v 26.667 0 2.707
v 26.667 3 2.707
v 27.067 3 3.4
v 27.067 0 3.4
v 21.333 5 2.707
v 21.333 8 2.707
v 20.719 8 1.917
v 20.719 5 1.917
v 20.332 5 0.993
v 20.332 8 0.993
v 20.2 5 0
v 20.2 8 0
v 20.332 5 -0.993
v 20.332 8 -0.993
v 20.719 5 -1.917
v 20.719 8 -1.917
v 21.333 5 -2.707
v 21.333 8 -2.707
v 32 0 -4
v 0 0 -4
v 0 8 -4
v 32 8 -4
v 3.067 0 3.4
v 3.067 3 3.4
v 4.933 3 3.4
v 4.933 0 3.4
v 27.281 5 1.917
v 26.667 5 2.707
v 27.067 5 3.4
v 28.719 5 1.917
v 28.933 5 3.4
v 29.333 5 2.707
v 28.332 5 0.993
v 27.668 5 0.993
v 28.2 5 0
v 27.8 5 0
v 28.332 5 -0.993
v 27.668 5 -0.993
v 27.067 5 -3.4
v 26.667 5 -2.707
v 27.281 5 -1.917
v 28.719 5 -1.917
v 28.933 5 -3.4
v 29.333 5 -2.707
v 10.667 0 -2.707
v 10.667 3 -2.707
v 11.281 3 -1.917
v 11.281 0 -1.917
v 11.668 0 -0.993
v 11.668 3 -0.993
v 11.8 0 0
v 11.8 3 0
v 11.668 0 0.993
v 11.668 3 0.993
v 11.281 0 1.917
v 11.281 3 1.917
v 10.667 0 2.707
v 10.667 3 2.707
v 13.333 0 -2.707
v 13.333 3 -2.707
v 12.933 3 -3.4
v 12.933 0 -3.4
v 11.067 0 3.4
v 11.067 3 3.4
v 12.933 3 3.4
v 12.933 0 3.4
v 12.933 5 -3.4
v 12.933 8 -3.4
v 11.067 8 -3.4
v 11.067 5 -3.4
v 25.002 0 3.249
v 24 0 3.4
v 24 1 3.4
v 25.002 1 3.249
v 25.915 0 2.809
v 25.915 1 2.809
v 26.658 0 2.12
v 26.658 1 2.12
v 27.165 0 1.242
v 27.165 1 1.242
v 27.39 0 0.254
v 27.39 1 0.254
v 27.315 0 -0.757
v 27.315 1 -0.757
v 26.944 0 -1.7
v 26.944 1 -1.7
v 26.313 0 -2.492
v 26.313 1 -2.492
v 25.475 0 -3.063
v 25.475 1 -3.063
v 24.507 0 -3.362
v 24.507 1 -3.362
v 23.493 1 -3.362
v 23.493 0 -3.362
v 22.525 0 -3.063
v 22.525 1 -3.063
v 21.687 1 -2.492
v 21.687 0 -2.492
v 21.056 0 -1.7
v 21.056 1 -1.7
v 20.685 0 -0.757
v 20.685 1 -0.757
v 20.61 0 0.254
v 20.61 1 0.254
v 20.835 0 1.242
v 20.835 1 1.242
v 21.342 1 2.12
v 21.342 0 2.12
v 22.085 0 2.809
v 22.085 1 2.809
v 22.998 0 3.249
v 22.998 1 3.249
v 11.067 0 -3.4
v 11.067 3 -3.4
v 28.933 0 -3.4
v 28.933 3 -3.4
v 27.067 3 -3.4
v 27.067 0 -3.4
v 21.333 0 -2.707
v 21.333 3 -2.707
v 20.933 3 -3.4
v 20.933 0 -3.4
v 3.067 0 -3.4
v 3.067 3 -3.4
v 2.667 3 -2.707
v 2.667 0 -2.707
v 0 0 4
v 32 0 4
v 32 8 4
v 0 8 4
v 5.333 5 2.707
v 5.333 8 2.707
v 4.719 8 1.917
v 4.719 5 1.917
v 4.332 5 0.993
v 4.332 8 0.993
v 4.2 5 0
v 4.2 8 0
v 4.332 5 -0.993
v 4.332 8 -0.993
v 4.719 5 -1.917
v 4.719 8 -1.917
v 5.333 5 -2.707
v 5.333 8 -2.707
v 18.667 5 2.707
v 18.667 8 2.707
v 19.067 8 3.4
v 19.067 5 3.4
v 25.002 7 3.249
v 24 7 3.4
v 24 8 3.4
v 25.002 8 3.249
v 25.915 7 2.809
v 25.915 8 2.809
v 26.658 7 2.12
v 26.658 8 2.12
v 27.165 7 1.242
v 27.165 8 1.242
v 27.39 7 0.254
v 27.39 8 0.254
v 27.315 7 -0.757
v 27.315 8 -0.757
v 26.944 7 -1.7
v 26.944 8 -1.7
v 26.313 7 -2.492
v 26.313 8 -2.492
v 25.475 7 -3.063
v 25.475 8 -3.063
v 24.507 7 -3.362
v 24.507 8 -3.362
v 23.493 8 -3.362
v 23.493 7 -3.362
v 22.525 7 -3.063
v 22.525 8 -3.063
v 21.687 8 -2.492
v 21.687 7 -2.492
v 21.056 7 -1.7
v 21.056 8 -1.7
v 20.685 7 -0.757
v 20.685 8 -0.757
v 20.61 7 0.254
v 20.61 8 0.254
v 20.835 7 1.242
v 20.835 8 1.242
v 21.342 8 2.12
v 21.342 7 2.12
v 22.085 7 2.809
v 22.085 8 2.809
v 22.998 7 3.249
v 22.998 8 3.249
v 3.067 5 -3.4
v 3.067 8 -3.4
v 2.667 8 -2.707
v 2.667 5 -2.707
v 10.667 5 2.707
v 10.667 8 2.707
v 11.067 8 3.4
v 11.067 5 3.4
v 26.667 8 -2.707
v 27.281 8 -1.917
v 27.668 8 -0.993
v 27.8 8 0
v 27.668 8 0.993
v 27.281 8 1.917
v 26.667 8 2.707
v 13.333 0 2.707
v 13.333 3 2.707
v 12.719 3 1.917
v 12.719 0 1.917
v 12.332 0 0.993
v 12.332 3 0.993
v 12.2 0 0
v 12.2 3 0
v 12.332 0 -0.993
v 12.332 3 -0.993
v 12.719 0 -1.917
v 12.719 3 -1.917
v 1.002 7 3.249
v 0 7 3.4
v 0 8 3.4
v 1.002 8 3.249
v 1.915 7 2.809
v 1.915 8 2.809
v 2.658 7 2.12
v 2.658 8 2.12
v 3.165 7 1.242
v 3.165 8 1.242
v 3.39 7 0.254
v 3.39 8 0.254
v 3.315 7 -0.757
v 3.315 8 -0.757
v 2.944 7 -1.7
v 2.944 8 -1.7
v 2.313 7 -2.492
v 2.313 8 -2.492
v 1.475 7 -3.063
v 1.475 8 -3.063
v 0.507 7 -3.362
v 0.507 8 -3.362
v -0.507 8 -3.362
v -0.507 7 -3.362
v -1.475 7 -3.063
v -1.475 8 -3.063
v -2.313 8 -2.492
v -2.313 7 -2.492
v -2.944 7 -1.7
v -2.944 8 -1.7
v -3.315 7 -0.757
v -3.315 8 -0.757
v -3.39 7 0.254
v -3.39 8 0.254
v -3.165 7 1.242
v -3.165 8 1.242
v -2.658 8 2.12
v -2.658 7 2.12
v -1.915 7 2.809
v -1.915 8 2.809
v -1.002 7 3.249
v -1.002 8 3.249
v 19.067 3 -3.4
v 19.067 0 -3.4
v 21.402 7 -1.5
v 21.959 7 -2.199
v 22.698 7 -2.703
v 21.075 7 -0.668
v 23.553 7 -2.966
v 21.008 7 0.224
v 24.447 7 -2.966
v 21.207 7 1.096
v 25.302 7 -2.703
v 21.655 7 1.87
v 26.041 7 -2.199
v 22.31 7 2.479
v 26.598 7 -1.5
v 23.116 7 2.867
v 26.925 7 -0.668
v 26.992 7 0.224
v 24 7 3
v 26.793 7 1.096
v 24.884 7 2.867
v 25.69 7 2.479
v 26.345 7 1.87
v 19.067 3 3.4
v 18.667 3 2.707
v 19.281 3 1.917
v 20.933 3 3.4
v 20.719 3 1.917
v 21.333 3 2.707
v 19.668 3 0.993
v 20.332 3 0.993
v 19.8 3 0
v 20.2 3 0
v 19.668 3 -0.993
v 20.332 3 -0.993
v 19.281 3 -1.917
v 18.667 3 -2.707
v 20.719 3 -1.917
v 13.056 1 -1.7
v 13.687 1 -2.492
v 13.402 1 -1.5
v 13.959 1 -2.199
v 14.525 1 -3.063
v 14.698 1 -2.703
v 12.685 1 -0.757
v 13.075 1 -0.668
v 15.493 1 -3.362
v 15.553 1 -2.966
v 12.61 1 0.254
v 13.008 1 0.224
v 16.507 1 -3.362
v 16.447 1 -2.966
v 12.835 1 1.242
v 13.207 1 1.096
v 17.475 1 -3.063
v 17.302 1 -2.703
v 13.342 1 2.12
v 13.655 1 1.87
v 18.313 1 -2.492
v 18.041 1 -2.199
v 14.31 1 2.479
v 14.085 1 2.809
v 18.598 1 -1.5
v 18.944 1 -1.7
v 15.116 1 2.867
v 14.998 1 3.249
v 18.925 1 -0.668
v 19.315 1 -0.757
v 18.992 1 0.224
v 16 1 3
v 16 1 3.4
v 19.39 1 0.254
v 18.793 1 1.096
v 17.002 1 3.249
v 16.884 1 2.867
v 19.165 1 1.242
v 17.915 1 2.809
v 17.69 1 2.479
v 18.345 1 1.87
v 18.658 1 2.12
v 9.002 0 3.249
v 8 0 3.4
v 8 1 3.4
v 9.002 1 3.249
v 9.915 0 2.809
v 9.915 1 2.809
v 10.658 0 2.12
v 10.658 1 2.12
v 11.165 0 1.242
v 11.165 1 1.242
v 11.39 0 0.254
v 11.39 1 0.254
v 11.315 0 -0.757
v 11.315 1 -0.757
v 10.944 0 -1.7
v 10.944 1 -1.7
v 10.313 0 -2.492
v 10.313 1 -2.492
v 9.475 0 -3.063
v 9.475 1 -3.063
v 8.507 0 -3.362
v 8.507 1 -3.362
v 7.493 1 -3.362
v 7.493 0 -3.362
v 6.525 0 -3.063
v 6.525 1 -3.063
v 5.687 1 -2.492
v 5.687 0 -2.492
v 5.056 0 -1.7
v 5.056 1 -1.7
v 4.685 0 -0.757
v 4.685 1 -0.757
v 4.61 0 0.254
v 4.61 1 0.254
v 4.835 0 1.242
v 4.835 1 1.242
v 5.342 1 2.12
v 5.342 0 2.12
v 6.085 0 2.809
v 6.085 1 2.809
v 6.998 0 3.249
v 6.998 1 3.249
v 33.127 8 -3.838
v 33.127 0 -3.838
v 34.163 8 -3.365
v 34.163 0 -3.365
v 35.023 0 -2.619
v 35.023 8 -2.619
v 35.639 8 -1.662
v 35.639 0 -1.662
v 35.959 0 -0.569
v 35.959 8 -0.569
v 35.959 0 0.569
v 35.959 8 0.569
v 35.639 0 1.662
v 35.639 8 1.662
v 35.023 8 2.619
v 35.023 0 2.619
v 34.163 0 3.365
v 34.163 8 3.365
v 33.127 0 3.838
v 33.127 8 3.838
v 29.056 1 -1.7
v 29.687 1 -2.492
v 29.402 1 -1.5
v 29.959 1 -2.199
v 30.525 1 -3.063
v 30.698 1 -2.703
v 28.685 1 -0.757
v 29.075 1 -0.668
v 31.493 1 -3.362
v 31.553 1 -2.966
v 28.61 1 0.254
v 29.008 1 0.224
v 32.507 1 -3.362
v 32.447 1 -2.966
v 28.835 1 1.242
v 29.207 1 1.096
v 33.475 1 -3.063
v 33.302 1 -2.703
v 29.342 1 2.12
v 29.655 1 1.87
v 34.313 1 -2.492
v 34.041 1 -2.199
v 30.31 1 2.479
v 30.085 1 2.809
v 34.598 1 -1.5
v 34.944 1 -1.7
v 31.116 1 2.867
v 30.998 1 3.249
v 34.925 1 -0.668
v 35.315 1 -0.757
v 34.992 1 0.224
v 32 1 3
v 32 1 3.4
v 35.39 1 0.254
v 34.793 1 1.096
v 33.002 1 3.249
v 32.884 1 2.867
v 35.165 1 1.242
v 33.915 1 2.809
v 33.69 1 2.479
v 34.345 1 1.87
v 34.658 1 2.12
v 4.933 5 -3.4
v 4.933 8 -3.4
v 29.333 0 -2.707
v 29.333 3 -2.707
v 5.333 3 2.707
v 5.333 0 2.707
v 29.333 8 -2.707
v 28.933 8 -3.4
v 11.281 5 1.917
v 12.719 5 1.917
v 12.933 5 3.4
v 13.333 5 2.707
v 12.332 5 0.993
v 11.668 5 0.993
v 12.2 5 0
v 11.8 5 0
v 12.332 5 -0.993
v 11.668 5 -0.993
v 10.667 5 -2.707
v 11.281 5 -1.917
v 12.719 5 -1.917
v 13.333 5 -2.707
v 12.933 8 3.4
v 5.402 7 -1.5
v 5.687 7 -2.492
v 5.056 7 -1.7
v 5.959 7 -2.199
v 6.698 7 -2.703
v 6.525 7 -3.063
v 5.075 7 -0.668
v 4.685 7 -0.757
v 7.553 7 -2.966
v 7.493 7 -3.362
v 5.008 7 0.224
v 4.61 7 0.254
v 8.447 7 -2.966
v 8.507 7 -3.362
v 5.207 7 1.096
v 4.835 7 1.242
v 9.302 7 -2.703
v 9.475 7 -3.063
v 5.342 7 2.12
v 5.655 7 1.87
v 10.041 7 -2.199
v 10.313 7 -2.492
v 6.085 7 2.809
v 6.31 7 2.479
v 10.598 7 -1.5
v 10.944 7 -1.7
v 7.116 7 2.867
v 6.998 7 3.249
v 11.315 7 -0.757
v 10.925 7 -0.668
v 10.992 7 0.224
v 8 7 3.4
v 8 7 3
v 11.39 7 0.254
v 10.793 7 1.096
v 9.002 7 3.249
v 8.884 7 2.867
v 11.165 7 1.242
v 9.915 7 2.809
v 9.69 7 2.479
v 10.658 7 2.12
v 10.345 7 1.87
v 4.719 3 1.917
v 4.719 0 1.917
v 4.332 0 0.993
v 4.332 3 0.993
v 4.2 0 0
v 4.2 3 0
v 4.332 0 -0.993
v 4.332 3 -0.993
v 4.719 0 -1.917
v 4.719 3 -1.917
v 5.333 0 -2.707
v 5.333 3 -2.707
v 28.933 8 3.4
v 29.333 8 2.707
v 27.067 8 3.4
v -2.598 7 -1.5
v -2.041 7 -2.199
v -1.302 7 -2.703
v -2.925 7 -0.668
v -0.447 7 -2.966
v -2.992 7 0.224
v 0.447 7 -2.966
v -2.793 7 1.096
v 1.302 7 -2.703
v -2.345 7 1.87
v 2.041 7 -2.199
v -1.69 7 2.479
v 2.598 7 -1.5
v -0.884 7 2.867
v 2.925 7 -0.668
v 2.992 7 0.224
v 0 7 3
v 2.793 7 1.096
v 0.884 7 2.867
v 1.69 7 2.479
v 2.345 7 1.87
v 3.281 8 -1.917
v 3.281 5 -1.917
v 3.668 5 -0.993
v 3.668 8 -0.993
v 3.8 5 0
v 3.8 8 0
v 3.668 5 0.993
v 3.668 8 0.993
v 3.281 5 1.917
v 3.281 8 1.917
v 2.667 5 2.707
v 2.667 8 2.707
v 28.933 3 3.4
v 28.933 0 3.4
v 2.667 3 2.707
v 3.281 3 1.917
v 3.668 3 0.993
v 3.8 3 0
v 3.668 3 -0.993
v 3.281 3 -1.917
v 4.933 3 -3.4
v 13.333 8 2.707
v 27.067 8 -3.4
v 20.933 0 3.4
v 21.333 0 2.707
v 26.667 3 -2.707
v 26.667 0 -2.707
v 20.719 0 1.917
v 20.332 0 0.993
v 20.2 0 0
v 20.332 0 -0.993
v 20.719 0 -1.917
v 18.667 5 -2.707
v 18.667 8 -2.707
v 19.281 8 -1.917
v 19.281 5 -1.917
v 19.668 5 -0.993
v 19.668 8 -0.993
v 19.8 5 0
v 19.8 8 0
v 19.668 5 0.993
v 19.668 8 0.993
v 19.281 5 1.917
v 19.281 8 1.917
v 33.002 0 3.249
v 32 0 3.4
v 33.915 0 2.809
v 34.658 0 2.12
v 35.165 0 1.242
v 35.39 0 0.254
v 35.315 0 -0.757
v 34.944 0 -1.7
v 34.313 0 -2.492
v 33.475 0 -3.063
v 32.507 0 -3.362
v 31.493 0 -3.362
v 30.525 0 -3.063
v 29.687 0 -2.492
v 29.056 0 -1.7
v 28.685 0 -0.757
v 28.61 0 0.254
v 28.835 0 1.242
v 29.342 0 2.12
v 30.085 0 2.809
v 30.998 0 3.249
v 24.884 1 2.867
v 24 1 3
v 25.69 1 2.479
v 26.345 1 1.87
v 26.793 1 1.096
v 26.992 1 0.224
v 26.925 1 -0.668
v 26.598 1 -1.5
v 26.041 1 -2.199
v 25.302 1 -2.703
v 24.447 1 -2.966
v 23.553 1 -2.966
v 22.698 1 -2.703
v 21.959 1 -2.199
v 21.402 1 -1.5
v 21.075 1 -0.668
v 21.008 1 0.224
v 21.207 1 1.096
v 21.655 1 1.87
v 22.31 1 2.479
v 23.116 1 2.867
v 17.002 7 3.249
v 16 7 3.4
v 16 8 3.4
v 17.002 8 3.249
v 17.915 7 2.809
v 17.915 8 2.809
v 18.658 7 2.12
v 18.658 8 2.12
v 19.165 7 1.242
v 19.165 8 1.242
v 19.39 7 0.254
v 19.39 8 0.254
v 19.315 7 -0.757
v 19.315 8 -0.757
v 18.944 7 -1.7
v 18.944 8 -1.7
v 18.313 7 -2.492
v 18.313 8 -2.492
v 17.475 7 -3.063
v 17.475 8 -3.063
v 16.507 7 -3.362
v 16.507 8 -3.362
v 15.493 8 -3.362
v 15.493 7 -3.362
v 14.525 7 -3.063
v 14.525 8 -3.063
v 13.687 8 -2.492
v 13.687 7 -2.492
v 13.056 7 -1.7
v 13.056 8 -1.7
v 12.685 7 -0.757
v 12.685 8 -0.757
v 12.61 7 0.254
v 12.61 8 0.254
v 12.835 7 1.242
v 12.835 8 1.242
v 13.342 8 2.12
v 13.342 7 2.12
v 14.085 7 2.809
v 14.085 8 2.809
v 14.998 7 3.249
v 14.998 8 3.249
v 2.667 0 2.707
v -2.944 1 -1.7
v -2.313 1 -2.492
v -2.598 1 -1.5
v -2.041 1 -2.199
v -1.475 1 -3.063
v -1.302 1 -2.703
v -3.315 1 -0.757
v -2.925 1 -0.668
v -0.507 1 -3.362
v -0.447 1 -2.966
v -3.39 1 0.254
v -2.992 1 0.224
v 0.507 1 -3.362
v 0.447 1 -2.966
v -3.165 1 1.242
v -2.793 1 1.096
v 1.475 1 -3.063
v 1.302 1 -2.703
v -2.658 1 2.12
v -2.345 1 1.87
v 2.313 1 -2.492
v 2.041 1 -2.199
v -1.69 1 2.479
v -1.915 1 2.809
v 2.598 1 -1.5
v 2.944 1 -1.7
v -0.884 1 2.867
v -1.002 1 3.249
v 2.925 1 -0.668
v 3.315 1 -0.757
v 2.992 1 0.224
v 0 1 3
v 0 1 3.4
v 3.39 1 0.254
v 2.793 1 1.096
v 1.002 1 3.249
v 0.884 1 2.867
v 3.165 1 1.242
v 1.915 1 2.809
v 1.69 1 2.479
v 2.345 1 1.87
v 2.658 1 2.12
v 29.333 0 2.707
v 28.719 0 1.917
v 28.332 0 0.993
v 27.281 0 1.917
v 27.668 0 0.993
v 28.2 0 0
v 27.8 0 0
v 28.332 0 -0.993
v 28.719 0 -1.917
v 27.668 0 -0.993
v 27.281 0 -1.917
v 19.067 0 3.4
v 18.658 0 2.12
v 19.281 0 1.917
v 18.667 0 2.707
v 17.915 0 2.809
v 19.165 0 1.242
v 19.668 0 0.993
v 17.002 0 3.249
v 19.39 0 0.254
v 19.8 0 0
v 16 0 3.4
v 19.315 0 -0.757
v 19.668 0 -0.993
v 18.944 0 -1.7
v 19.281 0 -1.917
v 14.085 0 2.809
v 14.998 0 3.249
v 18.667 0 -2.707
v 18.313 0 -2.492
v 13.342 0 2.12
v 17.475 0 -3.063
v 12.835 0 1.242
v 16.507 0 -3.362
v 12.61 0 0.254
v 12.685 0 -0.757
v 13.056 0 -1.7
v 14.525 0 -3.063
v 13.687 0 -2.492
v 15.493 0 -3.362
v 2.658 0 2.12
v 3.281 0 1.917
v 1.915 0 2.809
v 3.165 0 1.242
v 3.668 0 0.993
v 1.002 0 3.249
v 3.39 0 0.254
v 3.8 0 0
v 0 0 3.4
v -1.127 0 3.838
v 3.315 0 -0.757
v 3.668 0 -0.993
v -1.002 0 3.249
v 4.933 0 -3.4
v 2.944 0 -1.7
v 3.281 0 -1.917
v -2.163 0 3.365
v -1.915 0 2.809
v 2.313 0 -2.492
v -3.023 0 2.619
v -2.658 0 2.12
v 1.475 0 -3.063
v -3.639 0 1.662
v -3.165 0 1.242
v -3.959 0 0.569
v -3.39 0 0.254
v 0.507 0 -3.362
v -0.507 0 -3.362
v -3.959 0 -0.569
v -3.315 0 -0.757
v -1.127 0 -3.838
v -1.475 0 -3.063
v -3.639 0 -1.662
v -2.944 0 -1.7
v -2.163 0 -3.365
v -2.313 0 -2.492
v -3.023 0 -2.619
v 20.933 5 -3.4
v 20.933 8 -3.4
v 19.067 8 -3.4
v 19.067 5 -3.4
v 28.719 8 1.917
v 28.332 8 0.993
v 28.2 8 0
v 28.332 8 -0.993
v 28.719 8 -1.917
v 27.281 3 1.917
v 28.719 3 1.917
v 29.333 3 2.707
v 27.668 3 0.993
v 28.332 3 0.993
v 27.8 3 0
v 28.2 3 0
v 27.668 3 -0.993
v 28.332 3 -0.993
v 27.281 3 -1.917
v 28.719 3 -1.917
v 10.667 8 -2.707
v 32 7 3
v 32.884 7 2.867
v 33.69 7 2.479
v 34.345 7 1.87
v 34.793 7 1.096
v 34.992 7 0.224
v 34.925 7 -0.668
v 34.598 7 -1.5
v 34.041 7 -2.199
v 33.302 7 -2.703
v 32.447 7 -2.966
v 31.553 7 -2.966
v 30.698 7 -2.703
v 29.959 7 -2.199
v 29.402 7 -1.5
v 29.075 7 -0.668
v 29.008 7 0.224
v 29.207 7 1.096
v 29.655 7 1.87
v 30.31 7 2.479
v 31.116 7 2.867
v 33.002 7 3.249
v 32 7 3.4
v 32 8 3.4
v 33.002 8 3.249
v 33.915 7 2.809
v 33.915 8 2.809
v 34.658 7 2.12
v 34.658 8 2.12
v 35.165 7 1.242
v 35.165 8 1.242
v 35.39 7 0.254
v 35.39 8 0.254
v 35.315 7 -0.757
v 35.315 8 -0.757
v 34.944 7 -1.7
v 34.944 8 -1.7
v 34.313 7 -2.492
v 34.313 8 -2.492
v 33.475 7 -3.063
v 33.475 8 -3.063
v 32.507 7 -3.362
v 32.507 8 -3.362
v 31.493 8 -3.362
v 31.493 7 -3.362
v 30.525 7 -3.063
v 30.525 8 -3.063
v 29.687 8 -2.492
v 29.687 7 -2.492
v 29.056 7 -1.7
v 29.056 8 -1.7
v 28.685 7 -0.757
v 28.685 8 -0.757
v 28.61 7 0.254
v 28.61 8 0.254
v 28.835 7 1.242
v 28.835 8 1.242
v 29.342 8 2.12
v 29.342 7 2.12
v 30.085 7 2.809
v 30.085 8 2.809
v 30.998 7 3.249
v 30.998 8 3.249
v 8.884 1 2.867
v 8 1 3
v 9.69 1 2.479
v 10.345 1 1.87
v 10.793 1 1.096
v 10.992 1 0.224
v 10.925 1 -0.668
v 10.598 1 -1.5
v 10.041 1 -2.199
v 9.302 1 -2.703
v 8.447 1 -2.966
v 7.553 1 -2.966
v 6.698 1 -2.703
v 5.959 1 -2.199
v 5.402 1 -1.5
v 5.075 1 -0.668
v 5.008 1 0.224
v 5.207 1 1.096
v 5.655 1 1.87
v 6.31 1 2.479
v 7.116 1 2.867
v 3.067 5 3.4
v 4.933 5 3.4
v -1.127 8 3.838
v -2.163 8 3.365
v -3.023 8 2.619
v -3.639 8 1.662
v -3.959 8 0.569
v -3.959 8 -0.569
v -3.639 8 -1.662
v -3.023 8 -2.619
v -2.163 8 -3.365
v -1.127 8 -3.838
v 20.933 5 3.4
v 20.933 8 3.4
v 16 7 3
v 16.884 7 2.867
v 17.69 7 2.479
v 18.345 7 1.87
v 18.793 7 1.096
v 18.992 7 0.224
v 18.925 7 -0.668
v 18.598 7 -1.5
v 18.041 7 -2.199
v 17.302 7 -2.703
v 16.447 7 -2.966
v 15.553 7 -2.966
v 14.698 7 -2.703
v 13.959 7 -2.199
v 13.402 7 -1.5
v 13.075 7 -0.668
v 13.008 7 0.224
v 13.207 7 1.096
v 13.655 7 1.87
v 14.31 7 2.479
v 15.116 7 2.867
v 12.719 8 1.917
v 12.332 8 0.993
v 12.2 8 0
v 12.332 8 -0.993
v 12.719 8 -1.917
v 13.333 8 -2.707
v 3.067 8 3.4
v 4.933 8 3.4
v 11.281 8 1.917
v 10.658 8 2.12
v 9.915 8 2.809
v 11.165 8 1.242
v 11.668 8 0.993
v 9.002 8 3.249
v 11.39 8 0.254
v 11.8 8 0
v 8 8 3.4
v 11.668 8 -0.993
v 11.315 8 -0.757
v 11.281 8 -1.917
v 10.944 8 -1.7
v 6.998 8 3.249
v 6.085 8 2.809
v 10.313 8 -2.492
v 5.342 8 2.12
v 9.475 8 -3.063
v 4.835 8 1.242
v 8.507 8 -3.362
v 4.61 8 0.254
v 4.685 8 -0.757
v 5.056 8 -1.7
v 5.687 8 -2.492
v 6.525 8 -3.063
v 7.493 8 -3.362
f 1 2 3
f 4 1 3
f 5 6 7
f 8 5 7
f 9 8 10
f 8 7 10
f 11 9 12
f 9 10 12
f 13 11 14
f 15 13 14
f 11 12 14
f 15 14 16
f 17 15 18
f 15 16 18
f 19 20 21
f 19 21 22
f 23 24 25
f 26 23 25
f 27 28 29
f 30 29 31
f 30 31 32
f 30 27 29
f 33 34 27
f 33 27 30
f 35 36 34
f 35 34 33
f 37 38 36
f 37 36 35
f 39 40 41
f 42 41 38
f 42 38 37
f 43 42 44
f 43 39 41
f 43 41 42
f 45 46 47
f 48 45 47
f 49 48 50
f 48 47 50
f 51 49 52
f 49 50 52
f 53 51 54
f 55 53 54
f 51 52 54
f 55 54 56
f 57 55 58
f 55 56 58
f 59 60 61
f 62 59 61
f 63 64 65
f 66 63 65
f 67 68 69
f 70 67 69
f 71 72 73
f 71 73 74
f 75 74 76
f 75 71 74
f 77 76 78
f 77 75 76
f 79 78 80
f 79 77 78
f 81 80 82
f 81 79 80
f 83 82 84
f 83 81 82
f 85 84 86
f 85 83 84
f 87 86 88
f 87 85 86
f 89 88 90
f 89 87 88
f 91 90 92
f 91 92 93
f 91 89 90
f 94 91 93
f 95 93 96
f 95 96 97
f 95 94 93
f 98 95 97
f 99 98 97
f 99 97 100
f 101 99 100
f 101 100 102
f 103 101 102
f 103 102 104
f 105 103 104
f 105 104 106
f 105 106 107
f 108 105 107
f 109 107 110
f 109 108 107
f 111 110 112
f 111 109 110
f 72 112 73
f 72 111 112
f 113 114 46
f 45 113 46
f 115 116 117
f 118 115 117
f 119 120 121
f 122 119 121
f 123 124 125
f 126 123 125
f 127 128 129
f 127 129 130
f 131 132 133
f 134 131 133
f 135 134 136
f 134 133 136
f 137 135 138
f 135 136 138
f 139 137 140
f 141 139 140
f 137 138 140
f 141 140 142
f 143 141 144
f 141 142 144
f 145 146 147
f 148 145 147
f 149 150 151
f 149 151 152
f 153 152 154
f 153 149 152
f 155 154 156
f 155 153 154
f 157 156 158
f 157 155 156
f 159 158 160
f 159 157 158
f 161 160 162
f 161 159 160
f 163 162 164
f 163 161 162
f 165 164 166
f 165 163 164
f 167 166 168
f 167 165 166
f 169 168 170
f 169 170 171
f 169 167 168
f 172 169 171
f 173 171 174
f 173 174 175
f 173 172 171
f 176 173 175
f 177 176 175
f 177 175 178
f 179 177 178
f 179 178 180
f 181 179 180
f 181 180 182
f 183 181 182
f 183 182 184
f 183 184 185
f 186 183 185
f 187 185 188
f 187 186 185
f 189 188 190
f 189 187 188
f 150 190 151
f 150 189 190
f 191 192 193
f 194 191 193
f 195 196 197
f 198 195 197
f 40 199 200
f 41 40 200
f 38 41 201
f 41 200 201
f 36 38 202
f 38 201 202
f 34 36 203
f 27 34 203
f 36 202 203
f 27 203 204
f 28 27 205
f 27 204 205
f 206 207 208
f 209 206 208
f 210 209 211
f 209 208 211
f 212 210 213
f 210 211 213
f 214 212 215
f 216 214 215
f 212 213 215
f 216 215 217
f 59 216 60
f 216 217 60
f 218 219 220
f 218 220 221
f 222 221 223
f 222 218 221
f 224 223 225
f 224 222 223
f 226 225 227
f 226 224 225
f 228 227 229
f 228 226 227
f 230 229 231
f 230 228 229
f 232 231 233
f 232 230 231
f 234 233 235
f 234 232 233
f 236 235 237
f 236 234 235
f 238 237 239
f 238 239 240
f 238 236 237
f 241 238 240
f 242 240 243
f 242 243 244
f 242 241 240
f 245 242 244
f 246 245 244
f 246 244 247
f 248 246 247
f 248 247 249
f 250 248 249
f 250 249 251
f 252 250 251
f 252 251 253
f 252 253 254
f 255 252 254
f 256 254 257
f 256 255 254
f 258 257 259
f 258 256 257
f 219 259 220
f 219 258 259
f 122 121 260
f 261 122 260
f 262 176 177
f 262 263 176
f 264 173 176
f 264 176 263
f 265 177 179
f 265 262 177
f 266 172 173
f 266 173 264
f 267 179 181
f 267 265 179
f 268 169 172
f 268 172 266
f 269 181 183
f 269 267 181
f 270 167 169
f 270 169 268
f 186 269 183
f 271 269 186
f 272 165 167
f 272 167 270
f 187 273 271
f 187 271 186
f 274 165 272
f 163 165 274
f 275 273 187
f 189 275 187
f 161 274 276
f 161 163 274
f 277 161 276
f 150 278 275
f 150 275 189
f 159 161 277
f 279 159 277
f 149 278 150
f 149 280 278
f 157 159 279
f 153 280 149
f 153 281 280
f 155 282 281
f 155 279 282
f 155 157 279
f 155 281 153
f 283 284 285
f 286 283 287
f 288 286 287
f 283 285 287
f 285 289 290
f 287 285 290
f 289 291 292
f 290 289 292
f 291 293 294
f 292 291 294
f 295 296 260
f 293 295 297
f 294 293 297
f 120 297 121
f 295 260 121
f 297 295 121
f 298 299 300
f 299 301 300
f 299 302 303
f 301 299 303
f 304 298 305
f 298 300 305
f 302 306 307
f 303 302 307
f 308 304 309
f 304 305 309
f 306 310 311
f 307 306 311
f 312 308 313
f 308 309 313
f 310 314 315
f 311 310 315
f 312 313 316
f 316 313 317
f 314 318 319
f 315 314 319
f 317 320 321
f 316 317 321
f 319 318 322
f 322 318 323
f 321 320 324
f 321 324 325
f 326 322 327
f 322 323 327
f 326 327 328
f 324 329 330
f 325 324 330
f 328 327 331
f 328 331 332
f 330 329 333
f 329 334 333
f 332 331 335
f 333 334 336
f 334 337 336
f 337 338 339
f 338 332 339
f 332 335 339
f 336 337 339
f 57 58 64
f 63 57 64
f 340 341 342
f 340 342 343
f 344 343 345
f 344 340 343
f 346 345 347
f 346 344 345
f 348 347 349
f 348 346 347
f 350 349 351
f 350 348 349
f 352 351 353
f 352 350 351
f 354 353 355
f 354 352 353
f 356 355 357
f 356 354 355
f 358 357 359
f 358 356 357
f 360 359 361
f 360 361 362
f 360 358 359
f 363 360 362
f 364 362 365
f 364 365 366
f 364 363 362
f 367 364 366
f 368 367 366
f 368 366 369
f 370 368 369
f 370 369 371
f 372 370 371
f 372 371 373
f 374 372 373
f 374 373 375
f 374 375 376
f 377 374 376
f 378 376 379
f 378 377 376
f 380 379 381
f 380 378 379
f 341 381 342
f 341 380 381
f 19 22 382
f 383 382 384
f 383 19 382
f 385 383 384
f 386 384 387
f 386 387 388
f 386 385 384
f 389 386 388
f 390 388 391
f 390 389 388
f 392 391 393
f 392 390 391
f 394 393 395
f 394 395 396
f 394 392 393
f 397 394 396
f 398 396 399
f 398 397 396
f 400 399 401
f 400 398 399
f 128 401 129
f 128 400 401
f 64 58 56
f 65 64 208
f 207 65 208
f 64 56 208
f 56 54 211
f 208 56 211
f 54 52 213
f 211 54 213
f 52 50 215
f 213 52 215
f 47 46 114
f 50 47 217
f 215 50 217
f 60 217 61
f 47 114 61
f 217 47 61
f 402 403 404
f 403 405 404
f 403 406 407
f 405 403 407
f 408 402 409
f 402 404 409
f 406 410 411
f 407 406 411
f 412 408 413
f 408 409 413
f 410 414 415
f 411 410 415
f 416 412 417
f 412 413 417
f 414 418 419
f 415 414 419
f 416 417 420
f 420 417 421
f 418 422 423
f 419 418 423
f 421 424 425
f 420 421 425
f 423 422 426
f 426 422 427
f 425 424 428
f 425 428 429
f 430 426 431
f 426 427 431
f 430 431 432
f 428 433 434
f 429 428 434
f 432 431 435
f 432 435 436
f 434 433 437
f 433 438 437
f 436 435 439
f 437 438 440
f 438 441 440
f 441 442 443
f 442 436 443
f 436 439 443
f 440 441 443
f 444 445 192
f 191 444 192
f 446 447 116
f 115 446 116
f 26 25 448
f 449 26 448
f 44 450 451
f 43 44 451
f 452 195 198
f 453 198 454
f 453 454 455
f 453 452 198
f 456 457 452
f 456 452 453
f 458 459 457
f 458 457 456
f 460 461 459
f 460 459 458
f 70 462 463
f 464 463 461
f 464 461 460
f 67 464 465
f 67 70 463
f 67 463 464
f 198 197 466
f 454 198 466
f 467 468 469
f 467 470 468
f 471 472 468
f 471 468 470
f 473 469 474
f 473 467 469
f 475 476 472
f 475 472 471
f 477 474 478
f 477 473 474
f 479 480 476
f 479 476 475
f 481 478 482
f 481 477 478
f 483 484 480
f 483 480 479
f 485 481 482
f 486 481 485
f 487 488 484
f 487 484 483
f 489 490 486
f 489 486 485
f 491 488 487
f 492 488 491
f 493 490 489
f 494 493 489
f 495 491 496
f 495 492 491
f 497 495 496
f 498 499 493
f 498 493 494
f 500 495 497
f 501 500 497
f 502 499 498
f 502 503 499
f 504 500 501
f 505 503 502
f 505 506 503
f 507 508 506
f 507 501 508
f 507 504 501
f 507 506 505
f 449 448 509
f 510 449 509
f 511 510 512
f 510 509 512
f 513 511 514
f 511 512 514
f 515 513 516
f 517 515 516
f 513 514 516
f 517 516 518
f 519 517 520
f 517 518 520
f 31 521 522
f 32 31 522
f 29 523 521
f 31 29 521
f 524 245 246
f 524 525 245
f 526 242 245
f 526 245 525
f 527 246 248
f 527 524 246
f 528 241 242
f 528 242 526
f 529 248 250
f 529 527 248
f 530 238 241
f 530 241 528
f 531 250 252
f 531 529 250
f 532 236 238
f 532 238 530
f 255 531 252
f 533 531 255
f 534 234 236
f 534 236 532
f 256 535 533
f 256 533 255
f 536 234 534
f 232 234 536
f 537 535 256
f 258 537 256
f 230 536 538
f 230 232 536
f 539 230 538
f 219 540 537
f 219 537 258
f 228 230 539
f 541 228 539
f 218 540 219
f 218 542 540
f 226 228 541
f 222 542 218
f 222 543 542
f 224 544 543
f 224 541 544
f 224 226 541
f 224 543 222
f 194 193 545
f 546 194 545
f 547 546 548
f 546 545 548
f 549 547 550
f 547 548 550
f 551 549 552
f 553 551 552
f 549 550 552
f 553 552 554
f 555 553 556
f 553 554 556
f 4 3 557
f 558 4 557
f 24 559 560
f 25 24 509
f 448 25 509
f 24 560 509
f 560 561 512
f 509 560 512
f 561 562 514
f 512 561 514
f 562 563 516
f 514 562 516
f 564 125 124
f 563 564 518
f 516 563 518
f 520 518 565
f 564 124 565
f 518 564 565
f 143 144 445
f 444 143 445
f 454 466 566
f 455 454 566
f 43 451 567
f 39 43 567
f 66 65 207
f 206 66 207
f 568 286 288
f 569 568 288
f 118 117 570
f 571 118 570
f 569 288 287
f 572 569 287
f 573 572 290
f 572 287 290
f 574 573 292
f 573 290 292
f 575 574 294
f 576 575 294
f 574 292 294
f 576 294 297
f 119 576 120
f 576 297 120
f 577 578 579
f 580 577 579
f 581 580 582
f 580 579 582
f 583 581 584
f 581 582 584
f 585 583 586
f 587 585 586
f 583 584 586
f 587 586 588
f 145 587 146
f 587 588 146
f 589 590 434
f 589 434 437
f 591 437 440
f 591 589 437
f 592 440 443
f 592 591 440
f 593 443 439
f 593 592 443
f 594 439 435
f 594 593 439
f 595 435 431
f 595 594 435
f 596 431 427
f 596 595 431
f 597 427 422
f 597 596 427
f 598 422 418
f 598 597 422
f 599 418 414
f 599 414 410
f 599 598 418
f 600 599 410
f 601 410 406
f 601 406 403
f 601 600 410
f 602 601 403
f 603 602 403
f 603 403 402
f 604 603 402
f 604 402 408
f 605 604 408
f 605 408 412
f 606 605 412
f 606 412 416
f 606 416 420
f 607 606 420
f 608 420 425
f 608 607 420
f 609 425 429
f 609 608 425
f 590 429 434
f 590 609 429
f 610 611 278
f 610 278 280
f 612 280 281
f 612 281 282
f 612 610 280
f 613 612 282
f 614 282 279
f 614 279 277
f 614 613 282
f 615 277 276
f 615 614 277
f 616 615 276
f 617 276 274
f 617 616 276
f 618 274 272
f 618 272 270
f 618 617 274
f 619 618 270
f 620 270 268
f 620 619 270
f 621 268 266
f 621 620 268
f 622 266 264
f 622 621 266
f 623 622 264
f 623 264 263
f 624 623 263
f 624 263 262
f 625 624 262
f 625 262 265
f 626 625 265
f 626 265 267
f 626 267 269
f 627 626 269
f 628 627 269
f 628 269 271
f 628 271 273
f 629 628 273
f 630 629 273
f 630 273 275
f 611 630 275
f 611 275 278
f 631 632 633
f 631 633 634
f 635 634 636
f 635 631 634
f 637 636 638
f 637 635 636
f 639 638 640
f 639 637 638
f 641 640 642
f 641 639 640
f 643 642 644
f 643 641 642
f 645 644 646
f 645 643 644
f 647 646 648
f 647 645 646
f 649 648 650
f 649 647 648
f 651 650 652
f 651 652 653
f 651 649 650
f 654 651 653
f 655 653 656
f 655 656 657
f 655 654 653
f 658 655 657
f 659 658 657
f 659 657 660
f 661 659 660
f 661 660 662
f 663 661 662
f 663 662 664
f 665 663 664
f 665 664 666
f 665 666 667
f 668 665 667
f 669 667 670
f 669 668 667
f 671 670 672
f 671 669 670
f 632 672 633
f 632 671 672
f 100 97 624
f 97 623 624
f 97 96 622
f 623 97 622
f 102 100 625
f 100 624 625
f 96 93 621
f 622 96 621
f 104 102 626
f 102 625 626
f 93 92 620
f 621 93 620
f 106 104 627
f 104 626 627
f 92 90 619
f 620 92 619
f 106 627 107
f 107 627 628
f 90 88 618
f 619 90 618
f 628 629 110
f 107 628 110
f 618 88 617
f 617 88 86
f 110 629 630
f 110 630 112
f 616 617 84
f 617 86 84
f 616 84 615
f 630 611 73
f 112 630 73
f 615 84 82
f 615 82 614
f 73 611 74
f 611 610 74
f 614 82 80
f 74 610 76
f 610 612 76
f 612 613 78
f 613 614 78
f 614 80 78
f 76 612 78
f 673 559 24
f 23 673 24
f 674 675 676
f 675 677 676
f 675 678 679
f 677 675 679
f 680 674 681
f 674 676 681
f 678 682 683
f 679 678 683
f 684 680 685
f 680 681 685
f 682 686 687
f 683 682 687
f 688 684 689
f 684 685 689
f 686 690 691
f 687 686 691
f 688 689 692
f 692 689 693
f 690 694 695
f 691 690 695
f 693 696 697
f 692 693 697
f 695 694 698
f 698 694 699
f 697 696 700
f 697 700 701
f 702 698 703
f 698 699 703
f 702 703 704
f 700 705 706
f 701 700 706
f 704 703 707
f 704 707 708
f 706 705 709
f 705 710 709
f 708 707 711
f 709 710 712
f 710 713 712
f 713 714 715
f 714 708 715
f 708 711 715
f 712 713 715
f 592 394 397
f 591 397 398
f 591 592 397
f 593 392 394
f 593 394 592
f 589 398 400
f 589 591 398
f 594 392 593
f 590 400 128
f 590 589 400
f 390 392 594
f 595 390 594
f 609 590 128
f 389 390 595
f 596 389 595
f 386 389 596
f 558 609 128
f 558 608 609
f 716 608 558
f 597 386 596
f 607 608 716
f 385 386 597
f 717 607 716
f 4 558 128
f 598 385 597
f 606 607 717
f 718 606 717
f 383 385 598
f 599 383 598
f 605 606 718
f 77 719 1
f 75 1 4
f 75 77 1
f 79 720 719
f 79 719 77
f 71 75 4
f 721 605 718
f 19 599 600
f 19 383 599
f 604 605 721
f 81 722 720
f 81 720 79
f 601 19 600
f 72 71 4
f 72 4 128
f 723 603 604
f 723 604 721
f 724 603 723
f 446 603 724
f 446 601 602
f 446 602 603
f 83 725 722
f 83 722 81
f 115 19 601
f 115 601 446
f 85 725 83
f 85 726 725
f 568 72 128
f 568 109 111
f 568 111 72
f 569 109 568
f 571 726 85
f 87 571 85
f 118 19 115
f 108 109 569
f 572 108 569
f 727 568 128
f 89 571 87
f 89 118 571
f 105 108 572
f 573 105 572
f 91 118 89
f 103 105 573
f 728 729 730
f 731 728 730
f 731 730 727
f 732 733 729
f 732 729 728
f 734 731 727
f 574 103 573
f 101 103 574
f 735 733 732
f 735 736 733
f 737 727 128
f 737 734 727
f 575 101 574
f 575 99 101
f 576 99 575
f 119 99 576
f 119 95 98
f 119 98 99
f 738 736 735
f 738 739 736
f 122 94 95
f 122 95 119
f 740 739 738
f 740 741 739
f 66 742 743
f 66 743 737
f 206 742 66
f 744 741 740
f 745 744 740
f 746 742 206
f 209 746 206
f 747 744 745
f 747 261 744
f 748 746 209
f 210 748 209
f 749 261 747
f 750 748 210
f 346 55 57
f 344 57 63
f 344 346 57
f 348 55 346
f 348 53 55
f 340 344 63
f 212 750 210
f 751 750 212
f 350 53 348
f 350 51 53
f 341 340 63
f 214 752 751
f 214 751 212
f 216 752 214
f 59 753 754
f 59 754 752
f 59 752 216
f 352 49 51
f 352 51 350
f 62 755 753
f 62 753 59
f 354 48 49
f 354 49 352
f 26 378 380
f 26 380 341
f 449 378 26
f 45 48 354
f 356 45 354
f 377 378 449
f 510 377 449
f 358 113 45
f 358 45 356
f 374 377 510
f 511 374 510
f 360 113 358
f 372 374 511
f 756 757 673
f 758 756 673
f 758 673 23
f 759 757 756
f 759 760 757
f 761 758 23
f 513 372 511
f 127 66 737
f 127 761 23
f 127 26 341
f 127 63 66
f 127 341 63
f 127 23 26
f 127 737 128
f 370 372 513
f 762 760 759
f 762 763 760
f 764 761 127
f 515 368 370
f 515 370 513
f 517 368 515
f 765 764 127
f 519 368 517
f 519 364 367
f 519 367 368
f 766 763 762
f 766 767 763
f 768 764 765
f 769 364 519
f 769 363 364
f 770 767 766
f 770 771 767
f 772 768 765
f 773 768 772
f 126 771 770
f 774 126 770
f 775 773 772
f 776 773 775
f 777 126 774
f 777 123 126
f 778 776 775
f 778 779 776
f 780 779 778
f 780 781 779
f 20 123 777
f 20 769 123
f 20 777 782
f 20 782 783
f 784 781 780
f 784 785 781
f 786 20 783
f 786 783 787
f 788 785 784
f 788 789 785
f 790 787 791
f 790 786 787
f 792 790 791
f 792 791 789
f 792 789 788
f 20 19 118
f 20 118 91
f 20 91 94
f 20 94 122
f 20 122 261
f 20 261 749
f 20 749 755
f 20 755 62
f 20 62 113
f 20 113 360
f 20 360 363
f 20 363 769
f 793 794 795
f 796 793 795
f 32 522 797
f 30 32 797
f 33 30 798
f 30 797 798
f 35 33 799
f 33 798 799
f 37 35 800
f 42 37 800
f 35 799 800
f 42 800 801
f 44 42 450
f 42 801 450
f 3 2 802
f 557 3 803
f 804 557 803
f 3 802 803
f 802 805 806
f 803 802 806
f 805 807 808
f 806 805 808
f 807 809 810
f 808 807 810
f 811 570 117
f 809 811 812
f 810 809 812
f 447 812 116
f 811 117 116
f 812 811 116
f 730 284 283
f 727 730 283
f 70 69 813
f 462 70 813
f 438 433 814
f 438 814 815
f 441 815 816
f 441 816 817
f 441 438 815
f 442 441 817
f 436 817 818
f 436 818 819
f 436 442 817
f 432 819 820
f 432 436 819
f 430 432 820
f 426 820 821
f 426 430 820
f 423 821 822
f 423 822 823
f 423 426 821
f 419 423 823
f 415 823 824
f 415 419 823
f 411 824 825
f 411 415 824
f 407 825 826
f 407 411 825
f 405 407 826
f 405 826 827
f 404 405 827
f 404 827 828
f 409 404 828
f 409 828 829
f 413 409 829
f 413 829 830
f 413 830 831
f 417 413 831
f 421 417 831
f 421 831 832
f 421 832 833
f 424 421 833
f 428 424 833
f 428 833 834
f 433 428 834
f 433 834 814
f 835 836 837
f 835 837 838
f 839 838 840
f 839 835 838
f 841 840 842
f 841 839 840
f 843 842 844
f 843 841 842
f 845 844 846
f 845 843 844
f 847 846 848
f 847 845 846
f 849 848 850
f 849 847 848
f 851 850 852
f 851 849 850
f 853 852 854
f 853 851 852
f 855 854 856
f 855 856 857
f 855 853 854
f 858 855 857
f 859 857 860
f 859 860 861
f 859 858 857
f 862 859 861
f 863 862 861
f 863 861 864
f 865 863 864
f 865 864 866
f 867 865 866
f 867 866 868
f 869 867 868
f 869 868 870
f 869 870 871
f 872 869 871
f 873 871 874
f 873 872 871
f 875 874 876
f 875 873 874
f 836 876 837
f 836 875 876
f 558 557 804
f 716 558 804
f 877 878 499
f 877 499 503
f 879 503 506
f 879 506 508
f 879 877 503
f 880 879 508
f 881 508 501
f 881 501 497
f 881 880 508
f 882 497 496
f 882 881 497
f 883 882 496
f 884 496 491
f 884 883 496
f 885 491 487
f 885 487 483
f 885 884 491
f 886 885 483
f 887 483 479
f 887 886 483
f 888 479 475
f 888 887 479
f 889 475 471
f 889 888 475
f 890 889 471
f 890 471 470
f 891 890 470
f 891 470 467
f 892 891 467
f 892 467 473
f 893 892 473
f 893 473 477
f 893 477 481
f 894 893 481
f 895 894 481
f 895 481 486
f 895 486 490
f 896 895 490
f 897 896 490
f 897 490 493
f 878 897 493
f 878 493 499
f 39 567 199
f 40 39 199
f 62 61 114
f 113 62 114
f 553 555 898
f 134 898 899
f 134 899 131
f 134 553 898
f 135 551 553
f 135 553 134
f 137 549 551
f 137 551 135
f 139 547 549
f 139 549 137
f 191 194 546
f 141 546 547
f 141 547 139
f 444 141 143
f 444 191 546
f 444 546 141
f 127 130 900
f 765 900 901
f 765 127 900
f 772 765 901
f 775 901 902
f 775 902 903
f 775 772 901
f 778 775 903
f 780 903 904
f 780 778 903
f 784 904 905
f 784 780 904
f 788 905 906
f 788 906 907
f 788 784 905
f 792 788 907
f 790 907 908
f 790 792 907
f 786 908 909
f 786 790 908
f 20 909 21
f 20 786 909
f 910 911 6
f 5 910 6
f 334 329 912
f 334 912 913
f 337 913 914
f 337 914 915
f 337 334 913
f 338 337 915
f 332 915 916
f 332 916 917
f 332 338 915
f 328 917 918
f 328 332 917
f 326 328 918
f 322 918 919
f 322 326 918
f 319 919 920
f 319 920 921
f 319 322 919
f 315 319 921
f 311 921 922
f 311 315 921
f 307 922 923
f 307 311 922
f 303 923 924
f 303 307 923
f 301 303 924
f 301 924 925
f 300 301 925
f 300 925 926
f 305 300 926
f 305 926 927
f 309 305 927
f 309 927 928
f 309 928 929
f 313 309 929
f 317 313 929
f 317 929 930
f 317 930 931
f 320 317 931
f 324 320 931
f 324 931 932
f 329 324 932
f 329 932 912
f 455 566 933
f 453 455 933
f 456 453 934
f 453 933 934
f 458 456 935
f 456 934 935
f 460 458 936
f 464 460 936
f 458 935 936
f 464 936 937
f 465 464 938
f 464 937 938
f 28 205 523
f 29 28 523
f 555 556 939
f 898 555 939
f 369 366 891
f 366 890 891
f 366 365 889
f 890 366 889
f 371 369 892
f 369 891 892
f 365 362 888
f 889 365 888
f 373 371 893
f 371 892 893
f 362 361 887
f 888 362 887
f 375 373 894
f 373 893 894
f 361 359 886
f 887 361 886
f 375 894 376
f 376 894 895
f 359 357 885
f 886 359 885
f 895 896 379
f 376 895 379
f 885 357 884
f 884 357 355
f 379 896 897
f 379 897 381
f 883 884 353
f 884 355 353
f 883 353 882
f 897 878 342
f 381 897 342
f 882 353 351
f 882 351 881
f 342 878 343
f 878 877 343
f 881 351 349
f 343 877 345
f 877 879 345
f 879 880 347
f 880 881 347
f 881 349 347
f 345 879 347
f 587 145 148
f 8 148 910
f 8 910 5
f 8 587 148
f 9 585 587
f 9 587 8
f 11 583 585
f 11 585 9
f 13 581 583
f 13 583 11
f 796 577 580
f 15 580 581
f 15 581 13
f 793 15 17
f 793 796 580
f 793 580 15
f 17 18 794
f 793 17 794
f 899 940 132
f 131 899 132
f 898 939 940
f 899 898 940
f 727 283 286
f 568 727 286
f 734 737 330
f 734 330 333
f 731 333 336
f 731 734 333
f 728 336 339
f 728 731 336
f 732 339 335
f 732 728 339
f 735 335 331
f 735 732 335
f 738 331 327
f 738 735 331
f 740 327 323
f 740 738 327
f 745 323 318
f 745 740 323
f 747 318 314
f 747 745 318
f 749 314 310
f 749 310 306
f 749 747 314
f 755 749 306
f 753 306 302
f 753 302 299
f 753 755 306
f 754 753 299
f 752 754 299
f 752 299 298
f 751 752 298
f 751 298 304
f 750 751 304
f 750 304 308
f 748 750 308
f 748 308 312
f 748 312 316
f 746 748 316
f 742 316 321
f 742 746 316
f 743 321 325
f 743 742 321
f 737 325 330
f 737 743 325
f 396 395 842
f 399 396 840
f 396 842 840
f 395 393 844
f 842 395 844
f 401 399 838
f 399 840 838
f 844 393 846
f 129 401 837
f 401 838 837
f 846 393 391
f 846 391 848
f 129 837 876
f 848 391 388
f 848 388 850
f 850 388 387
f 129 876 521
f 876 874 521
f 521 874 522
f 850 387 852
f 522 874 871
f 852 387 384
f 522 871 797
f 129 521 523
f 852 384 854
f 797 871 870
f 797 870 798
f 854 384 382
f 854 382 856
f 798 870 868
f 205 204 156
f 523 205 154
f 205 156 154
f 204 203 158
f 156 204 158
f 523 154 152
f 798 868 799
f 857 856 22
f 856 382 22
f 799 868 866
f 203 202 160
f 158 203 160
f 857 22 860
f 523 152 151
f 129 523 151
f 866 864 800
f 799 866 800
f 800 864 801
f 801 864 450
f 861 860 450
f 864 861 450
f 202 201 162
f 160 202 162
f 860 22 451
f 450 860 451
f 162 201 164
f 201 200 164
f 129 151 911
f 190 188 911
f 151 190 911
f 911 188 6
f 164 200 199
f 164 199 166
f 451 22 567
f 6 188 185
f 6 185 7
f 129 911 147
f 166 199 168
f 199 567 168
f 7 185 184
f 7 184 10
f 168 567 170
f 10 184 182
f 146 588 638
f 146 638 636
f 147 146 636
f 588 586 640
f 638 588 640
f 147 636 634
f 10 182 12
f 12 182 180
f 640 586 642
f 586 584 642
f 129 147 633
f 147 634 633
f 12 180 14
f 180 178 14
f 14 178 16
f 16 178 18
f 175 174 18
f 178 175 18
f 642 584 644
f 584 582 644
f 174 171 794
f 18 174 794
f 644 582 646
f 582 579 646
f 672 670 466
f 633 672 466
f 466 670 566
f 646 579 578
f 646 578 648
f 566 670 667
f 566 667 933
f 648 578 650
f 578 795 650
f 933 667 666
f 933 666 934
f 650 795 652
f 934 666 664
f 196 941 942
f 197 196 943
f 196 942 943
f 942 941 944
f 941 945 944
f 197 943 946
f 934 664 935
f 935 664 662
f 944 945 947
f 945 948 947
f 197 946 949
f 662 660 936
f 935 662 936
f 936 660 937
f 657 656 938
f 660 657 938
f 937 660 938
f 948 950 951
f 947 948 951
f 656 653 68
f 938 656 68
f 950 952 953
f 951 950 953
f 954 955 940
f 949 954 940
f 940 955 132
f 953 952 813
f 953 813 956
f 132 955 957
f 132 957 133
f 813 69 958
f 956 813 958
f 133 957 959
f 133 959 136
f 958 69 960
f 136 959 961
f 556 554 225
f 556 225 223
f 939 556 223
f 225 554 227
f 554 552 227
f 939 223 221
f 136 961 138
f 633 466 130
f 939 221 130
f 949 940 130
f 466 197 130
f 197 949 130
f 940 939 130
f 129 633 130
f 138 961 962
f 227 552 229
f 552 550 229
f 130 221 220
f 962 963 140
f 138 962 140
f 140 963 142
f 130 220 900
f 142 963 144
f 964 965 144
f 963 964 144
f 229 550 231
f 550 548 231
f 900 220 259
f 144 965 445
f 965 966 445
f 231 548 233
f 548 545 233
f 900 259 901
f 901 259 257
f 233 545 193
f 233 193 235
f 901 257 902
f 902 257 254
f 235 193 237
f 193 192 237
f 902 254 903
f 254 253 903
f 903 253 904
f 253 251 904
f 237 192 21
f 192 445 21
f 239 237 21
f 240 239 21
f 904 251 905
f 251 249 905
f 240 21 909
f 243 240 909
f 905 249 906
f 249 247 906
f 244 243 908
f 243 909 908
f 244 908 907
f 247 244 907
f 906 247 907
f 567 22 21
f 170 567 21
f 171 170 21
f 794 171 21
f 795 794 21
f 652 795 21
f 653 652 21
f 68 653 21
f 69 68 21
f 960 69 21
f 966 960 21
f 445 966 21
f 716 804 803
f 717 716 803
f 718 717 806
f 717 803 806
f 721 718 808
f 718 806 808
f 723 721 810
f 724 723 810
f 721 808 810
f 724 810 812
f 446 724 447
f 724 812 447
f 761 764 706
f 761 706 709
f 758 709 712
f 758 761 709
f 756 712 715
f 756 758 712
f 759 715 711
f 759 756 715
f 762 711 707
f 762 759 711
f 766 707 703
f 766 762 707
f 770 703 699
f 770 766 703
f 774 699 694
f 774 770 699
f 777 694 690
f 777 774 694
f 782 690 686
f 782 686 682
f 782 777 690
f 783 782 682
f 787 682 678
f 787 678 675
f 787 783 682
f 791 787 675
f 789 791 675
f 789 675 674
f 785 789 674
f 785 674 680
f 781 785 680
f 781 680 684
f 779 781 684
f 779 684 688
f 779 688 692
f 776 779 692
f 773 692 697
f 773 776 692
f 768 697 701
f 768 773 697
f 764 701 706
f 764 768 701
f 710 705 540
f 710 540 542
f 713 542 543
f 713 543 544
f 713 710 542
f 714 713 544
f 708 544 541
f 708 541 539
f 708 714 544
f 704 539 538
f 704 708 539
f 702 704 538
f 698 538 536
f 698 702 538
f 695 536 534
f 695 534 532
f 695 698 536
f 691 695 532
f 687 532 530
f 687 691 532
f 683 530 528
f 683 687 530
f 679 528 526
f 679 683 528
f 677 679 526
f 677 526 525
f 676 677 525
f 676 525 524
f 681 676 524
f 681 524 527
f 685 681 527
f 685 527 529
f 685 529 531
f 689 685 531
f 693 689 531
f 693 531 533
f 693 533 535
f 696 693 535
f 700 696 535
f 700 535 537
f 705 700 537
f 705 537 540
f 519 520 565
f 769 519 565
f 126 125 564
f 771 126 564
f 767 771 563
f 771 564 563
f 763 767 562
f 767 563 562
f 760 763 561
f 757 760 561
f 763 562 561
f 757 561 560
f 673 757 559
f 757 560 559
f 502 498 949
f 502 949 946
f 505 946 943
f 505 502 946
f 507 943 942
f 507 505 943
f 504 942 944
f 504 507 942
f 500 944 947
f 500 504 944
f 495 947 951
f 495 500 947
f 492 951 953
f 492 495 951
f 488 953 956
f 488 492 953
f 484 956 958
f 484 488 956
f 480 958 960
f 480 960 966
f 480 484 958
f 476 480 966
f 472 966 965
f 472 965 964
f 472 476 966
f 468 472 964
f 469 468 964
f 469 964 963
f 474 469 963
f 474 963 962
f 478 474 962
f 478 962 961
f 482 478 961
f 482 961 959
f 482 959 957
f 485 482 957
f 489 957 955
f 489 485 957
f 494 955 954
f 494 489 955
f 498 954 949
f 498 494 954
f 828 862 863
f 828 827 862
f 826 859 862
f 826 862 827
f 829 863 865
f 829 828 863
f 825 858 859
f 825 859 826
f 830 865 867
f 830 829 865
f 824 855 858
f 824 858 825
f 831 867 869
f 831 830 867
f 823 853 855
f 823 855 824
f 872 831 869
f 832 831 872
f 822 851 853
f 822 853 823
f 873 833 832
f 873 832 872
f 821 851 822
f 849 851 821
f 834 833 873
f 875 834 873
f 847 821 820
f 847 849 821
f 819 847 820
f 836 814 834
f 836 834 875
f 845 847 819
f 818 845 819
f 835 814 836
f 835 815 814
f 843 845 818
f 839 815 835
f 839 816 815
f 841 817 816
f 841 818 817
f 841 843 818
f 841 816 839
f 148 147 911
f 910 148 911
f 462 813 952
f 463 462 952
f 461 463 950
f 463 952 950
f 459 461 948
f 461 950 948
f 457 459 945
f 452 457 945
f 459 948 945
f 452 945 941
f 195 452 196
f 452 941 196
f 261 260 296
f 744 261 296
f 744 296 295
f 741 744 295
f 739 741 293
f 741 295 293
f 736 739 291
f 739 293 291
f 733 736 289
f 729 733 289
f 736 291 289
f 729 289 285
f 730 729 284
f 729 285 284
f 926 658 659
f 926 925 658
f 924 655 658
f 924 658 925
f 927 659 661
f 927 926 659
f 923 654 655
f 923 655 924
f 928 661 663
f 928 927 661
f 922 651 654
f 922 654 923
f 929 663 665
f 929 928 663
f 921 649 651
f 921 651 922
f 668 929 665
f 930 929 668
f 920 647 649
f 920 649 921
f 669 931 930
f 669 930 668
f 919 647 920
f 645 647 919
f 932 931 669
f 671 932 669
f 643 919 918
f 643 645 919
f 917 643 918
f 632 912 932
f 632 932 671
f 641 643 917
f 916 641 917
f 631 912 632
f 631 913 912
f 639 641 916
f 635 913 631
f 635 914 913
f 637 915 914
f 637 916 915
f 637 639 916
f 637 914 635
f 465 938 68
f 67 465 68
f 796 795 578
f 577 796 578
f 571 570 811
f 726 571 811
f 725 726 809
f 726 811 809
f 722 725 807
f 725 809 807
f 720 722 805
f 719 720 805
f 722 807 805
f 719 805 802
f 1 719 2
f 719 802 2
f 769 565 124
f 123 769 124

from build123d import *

# Parameters (mm, degrees)
SKETCH1_R            = 3
BOSS_EXTRUDE1_DEPTH  = 8
CUT_EXTRUDE1_START   = -1
SKETCH2_R            = 3.4
SKETCH2_R_2          = 3
CUT_EXTRUDE1_DEPTH   = 1
LPATTERN1_COUNT      = 5
LPATTERN1_PITCH      = 8
LPATTERN1_COUNT_DIR2 = 2
LPATTERN1_PITCH_DIR2 = 7
CUT_EXTRUDE2_DEPTH   = 3
LPATTERN2_COUNT      = 4
LPATTERN2_PITCH      = 8
LPATTERN2_COUNT_DIR2 = 2
LPATTERN2_PITCH_DIR2 = 5


with BuildPart() as part:
    # Sketch1 → Boss-Extrude1 (new body)
    with BuildSketch(Plane(origin=(0, 0, 0), x_dir=(1, 0, 0), z_dir=(0, 1, 0))):
        with BuildLine():
            Line((0, 4), (32, 4))
            ThreePointArc((32, 4), (36, 0), (32, -4))
            Line((32, -4), (0, -4))
            ThreePointArc((0, -4), (-4, 0), (0, 4))
        make_face()
        with Locations(Location((8, 0, 0), (0, 0, 270))):
            Circle(SKETCH1_R, mode=Mode.SUBTRACT)
        with Locations(Location((16, 0, 0), (0, 0, 270))):
            Circle(SKETCH1_R, mode=Mode.SUBTRACT)
        with Locations(Location((0, 0, 0), (0, 0, 270))):
            Circle(SKETCH1_R, mode=Mode.SUBTRACT)
        with Locations(Location((24, 0, 0), (0, 0, 270))):
            Circle(SKETCH1_R, mode=Mode.SUBTRACT)
        with Locations(Location((32, 0, 0), (0, 0, 270))):
            Circle(SKETCH1_R, mode=Mode.SUBTRACT)
    extrude(amount=BOSS_EXTRUDE1_DEPTH)

    # Sketch2 → Cut-Extrude1 (cut)
    with BuildSketch(Plane(origin=(0, 8, 0), x_dir=(1, 0, 0), z_dir=(0, 1, 0)).offset(CUT_EXTRUDE1_START)):
        with Locations(Location((0, 0, 0), (0, 0, 270))):
            Circle(SKETCH2_R)
        with Locations(Location((0, 0, 0), (0, 0, 270))):
            Circle(SKETCH2_R_2, mode=Mode.SUBTRACT)
    cut_extrude1 = extrude(amount=CUT_EXTRUDE1_DEPTH, mode=Mode.SUBTRACT)

    # LPattern1: Cut-Extrude1 5 × 2
    with Locations(*[(i * LPATTERN1_PITCH, -j * LPATTERN1_PITCH_DIR2, 0) for i in range(LPATTERN1_COUNT) for j in range(LPATTERN1_COUNT_DIR2) if (i, j) != (0, 0)]):
        add(cut_extrude1, mode=Mode.SUBTRACT)

    # Sketch3 → Cut-Extrude2 (cut)
    with BuildSketch(Plane(origin=(0, 8, 0), x_dir=(1, 0, 0), z_dir=(0, 1, 0))):
        with BuildLine():
            Line((3.066679245, -3.4), (4.933320755, -3.4))
            Line((4.933320755, -3.4), (5.333320755, -2.707179677))
            ThreePointArc((5.333320755, -2.707179677), (4.2, 0), (5.333320755, 2.707179677))
            Line((5.333320755, 2.707179677), (4.933320755, 3.4))
            Line((4.933320755, 3.4), (3.066679245, 3.4))
            Line((3.066679245, 3.4), (2.666679245, 2.707179677))
            ThreePointArc((2.666679245, 2.707179677), (3.8, 0), (2.666679245, -2.707179677))
            Line((2.666679245, -2.707179677), (3.066679245, -3.4))
        make_face()
    cut_extrude2 = extrude(amount=-CUT_EXTRUDE2_DEPTH, mode=Mode.SUBTRACT)

    # LPattern2: Cut-Extrude2 4 × 2
    with Locations(*[(i * LPATTERN2_PITCH, -j * LPATTERN2_PITCH_DIR2, 0) for i in range(LPATTERN2_COUNT) for j in range(LPATTERN2_COUNT_DIR2) if (i, j) != (0, 0)]):
        add(cut_extrude2, mode=Mode.SUBTRACT)


solid = part.part
